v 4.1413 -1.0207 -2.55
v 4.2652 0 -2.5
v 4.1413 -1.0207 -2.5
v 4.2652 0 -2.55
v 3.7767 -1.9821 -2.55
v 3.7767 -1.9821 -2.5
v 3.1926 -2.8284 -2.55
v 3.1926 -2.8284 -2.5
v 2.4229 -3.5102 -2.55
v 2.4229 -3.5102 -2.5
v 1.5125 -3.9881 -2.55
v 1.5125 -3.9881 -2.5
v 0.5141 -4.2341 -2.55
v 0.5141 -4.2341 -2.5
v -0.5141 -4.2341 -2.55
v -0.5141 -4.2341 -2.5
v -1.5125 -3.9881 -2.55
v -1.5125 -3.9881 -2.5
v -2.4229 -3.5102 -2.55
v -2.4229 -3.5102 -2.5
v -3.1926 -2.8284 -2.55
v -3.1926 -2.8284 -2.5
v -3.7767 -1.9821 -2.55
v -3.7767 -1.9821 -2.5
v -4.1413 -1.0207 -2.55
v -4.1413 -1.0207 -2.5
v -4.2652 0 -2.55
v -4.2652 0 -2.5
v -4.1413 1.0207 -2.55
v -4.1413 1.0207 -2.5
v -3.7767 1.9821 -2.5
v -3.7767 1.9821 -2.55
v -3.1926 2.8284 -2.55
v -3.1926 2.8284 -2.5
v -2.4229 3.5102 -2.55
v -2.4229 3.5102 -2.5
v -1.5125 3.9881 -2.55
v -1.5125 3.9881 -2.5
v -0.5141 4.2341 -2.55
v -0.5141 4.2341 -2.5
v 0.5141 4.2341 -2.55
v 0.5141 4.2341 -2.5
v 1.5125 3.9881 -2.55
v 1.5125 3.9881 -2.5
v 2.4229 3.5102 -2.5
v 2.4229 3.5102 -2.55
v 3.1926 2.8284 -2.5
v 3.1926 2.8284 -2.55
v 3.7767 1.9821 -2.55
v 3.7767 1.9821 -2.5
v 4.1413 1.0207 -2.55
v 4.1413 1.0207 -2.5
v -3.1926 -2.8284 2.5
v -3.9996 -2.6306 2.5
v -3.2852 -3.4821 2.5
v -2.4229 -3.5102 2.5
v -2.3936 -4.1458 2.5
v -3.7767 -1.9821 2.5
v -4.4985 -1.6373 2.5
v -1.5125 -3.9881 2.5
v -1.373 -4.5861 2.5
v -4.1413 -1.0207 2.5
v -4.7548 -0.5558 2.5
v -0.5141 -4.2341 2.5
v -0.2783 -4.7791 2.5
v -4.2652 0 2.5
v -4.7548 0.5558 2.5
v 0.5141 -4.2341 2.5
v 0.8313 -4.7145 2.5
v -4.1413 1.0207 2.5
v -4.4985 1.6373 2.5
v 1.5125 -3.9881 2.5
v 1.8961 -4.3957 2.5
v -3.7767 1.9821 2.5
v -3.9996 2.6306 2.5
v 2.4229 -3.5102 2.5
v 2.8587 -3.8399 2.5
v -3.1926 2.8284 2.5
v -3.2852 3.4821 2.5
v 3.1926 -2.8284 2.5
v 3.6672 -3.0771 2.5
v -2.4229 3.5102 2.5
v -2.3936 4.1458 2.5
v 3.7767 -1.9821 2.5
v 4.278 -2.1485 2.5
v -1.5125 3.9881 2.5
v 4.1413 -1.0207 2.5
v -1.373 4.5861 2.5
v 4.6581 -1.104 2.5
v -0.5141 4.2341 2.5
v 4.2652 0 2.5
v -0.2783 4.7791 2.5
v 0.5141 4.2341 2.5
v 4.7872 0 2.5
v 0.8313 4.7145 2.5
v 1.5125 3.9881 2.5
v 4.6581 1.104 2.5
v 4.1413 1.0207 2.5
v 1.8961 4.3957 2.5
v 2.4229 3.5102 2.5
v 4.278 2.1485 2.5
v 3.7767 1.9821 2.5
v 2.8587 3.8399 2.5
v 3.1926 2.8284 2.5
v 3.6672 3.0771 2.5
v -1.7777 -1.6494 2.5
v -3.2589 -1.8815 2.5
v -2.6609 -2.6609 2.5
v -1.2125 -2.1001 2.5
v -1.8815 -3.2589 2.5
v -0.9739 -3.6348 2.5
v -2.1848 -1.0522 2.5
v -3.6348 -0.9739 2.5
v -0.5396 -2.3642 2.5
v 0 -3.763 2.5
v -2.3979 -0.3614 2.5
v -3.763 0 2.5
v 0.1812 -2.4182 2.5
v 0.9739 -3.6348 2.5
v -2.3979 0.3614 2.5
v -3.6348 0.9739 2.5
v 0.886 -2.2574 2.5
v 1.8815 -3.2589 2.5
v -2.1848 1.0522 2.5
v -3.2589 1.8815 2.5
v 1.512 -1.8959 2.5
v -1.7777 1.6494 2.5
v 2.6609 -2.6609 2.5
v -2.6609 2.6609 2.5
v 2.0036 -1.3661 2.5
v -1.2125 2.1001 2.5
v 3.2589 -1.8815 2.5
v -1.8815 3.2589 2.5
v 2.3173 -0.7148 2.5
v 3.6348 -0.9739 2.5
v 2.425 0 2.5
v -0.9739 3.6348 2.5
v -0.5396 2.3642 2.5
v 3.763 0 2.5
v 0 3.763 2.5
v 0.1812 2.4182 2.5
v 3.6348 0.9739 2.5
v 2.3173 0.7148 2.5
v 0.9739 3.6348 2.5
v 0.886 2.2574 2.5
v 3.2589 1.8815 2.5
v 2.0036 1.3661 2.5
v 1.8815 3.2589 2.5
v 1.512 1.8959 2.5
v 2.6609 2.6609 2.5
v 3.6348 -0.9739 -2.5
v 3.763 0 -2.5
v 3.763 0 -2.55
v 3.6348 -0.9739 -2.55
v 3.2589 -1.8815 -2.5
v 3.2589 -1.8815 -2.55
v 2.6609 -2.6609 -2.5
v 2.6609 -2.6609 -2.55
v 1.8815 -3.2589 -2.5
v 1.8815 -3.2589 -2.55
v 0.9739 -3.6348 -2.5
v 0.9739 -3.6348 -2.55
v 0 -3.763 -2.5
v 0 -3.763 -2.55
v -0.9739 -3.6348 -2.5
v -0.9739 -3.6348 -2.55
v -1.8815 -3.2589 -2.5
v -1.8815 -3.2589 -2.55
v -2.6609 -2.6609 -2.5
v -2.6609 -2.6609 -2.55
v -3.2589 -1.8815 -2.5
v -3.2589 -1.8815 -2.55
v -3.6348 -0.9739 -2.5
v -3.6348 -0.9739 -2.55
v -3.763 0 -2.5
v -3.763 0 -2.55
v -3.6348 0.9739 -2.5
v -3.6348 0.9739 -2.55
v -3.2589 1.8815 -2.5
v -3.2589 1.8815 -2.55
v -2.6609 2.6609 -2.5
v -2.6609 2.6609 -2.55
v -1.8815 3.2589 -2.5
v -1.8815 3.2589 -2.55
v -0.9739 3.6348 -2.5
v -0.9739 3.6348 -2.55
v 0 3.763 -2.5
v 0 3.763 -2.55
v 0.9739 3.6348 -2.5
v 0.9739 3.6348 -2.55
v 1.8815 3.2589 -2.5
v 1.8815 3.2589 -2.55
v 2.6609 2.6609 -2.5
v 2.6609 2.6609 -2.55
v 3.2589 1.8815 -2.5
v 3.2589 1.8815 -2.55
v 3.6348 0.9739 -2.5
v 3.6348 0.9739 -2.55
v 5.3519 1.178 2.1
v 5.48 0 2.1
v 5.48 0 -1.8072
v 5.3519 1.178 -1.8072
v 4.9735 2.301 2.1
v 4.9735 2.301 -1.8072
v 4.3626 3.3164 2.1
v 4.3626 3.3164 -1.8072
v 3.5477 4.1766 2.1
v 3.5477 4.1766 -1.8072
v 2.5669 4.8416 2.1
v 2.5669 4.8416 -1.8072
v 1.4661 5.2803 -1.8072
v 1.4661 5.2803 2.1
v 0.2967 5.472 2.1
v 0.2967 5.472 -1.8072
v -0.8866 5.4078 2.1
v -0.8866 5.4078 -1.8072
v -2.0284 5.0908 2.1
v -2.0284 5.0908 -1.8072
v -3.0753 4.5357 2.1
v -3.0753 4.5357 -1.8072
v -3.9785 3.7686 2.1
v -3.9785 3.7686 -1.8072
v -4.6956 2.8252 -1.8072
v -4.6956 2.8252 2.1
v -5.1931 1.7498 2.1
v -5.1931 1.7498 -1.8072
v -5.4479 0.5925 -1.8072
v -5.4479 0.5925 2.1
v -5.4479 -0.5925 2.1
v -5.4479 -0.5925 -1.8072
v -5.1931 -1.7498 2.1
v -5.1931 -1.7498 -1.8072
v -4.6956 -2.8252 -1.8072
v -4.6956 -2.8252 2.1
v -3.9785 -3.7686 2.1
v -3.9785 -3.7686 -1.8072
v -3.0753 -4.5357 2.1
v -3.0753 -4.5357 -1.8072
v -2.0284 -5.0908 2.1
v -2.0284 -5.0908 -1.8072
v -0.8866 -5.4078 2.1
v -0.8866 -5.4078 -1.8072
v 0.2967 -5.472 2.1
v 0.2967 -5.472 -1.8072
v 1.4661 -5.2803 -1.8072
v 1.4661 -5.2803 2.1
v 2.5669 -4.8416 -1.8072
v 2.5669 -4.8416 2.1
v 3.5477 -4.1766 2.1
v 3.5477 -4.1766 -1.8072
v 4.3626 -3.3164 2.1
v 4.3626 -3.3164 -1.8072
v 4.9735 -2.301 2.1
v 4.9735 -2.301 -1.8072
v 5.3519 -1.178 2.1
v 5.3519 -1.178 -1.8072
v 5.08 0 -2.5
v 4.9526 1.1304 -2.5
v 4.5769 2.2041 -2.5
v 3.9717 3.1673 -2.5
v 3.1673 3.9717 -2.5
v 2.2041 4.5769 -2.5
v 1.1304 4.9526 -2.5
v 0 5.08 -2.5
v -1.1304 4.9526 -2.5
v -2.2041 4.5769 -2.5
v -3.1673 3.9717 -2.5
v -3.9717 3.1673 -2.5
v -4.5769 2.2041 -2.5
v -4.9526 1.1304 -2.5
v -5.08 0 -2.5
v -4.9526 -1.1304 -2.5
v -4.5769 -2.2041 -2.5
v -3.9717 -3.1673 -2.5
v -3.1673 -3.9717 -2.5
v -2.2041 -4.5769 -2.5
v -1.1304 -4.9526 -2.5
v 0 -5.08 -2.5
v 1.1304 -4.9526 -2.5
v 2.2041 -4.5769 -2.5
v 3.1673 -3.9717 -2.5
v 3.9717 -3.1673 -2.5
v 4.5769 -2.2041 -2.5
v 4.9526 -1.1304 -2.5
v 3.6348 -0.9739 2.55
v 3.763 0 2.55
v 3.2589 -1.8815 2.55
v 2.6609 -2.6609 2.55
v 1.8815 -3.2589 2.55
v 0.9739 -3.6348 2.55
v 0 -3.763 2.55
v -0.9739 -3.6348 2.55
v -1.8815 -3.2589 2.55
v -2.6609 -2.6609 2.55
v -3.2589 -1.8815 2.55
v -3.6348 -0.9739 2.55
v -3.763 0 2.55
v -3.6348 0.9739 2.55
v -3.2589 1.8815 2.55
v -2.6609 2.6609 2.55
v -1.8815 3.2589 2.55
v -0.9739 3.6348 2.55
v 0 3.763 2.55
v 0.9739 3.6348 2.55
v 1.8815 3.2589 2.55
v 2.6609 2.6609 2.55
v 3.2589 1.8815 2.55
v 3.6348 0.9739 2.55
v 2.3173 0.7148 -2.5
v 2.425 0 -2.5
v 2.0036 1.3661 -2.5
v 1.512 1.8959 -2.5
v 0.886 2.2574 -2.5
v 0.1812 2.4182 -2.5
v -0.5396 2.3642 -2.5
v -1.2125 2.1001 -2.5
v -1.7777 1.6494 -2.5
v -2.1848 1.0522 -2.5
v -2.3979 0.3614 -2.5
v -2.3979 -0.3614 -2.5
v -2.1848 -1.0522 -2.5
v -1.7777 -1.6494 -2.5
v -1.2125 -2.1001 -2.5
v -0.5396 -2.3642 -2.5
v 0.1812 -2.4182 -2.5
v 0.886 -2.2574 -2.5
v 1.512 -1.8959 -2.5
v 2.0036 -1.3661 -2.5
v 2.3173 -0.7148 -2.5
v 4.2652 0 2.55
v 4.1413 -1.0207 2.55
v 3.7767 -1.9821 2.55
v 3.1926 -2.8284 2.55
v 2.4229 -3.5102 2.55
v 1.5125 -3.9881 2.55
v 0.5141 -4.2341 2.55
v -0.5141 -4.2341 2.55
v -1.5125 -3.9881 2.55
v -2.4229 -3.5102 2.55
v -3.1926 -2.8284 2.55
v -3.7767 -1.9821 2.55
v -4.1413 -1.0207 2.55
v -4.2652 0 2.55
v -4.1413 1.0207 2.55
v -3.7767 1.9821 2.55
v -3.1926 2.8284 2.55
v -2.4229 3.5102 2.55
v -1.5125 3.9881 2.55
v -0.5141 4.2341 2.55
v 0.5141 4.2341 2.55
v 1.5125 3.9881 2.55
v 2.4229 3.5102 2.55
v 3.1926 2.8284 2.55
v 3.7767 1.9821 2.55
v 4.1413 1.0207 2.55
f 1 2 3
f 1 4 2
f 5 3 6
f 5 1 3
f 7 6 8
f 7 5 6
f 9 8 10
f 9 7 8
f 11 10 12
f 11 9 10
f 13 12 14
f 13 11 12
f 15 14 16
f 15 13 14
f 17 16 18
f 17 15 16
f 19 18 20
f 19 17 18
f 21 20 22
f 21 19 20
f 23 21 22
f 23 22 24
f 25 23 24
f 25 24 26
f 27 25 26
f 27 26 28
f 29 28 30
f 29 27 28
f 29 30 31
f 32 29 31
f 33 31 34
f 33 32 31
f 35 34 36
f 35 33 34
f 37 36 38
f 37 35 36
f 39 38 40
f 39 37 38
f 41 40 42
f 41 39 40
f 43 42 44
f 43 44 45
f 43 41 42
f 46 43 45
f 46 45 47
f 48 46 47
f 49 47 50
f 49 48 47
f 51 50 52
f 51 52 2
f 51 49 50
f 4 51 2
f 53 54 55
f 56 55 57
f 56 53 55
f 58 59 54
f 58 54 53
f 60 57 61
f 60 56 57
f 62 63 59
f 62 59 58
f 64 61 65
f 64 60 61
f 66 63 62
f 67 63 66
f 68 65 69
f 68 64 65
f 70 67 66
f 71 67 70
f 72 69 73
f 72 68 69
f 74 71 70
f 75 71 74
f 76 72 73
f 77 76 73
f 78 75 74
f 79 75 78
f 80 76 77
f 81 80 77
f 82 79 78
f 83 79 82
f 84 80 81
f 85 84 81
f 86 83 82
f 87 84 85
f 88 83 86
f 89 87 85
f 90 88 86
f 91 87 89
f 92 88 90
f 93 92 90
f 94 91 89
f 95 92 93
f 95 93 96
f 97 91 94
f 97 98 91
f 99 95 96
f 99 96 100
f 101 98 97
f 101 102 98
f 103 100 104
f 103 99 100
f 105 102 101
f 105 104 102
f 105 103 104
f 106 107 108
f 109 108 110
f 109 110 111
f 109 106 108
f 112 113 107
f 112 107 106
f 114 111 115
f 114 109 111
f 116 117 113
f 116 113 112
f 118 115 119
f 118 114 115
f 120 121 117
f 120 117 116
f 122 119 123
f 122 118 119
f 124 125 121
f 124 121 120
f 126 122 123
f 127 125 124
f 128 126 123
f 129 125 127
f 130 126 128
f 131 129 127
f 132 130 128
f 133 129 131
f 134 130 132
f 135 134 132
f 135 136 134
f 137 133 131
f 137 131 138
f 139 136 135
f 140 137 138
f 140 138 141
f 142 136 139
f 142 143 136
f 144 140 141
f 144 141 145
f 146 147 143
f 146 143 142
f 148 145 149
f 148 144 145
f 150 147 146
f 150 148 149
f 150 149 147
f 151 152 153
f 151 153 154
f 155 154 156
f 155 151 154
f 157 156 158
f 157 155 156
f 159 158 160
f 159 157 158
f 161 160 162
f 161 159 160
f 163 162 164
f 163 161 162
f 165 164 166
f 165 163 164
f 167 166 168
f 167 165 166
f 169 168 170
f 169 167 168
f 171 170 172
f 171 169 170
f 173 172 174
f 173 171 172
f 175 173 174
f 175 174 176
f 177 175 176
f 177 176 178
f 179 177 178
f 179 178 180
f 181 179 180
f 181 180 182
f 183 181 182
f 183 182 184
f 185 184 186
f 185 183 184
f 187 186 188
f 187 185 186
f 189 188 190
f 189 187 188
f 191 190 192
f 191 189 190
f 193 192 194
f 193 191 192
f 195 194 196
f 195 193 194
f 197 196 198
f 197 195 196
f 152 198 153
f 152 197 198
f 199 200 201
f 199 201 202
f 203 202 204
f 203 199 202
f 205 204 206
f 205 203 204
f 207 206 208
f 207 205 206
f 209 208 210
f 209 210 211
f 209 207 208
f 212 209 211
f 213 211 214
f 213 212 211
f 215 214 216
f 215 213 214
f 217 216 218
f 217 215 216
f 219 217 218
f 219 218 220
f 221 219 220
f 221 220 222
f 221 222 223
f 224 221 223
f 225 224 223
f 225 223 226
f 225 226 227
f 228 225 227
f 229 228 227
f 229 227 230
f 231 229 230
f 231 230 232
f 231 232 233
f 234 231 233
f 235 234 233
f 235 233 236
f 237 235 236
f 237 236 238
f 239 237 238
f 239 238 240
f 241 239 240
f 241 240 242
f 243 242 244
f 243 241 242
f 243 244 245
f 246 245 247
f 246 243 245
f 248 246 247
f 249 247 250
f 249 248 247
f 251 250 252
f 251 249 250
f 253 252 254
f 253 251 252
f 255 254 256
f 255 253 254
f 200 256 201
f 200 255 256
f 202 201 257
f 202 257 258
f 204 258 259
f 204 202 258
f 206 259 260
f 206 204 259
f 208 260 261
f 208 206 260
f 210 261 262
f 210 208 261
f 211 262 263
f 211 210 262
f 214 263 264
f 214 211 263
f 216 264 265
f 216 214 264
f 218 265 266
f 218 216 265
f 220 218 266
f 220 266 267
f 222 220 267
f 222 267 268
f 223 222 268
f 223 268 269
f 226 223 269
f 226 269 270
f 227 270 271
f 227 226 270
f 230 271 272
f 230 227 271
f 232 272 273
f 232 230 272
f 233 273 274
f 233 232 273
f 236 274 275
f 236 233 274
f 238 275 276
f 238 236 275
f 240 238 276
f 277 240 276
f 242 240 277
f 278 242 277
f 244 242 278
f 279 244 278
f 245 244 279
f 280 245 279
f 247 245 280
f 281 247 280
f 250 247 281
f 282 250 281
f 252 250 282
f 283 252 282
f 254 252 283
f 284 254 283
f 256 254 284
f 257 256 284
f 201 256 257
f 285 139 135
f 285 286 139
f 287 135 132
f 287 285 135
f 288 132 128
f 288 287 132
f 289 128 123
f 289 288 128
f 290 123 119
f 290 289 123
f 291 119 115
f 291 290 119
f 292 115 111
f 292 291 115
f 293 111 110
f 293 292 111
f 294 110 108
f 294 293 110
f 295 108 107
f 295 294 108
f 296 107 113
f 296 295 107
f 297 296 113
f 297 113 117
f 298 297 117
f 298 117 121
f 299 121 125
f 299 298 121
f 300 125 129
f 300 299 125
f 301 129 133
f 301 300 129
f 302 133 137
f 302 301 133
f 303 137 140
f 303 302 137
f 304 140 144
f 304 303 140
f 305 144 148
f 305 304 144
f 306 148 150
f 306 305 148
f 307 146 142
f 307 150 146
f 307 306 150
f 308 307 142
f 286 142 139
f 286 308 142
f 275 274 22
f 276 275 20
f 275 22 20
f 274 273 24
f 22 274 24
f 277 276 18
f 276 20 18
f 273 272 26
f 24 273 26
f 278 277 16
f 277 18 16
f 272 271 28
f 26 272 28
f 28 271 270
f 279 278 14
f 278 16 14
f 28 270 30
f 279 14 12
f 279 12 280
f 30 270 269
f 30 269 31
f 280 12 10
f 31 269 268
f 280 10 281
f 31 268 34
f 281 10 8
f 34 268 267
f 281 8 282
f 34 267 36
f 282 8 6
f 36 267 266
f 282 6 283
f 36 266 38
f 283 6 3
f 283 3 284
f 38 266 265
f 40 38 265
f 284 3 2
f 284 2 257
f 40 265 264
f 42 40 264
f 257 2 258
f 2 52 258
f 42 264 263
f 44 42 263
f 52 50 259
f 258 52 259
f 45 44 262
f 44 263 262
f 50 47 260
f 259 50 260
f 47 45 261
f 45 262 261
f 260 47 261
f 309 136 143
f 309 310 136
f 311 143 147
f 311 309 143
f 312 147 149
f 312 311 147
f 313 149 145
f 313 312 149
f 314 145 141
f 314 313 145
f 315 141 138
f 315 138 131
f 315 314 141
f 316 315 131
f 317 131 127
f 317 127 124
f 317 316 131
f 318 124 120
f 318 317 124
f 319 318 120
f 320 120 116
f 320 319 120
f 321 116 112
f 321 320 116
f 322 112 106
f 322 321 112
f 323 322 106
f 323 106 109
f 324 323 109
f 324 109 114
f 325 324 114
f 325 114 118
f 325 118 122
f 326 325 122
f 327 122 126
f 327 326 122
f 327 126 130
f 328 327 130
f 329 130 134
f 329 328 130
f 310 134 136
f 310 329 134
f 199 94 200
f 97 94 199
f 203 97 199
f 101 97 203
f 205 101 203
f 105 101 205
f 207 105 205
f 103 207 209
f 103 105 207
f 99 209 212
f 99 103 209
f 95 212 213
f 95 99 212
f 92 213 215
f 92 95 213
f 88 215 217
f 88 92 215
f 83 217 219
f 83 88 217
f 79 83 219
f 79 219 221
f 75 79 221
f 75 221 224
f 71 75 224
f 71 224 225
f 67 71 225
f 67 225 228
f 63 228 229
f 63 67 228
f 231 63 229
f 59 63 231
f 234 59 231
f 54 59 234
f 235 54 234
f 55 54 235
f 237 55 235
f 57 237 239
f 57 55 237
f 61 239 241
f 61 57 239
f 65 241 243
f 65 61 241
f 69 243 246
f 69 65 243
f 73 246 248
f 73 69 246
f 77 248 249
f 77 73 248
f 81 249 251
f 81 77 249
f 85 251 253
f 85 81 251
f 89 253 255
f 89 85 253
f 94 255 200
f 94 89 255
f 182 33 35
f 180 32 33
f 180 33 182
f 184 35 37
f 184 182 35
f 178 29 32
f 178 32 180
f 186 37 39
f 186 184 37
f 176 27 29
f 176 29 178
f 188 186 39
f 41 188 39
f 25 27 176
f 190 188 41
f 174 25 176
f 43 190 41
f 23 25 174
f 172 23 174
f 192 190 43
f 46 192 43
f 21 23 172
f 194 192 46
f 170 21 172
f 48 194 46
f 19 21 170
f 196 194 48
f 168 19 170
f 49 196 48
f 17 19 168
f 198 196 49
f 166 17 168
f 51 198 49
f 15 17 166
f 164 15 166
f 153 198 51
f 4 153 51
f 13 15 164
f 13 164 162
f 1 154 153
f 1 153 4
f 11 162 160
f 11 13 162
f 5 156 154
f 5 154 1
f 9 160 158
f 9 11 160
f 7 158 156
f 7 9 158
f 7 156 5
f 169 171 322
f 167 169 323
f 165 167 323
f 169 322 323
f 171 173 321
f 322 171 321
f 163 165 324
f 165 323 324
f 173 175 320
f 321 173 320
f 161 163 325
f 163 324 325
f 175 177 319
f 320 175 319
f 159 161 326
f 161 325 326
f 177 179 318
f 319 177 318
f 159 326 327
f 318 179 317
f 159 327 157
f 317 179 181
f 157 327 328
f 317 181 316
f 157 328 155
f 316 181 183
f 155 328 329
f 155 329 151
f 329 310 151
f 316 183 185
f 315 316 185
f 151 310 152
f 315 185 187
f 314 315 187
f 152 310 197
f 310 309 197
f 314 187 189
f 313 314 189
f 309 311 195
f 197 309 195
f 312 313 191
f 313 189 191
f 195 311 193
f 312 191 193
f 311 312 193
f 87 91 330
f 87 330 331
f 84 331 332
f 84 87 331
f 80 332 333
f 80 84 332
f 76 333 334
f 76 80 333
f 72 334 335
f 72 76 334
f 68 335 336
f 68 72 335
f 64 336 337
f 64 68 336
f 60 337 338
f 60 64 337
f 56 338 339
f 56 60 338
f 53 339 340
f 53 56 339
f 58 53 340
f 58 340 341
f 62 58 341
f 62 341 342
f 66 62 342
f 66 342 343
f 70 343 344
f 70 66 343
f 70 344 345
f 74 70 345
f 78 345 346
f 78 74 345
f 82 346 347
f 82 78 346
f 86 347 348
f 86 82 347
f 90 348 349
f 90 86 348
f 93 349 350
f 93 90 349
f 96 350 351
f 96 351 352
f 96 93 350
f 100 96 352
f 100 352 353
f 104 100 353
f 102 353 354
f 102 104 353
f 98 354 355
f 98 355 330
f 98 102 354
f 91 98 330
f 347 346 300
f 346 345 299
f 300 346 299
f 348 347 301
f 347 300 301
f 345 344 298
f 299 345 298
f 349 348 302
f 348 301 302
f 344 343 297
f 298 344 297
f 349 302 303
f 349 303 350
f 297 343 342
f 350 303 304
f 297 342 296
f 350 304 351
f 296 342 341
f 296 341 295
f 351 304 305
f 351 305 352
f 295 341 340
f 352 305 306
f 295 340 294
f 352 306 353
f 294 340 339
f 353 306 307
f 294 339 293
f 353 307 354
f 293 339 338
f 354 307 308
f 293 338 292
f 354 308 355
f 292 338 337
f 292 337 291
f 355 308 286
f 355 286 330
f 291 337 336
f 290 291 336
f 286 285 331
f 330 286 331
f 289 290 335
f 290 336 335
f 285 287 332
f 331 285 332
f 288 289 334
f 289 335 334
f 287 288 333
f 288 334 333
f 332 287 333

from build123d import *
from OCP.BRepFilletAPI import BRepFilletAPI_MakeChamfer

# Parameters (mm, degrees)
CROQUIS1_R              = 5.48
CROQUIS1_R_2            = 2.425
SALIENTE_EXTRUIR1_DEPTH = 2.5
CHAFL_N1_SIZE           = 0.4
CHAFL_N1_SIZE2          = 0.692820323
CROQUIS2_R              = 4.265221528
CROQUIS2_R_2            = 3.76303741
SALIENTE_EXTRUIR2_DEPTH = 2.55


with BuildPart() as part:
    # Croquis1 → Saliente-Extruir1 (new, symmetric)
    with BuildSketch(Plane.XY):
        Circle(CROQUIS1_R)
        Circle(CROQUIS1_R_2, mode=Mode.SUBTRACT)
    extrude(amount=SALIENTE_EXTRUIR1_DEPTH, both=True)

    # Chaflán1: one chamfer whose edges measure the first distance from different faces: ONE call of the kernel's chamfer builder (chamfer() names one face for all edges)
    chafl_n1_edges_1 = [part.edges().sort_by_distance(p)[0] for p in [
        (-5.48, 0, -2.5),
    ]]
    chafl_n1_side_1 = [part.faces().sort_by_distance(p)[0] for p in [
        (-5.325002194, 0, -2.5),
    ]]
    chafl_n1_edges_2 = [part.edges().sort_by_distance(p)[0] for p in [
        (-5.48, 0, 2.5),
    ]]
    chafl_n1_side_2 = [part.faces().sort_by_distance(p)[0] for p in [
        (-5.48, 0, 0),
    ]]
    chafl_n1 = BRepFilletAPI_MakeChamfer(part.part.solid().wrapped)
    for e in chafl_n1_edges_1:
        chafl_n1.Add(CHAFL_N1_SIZE, CHAFL_N1_SIZE2, e.wrapped, chafl_n1_side_1[0].wrapped)  # the first distance lies on this face
    for e in chafl_n1_edges_2:
        chafl_n1.Add(CHAFL_N1_SIZE, CHAFL_N1_SIZE2, e.wrapped, chafl_n1_side_2[0].wrapped)  # the first distance lies on this face
    add(Compound.cast(chafl_n1.Shape()), mode=Mode.REPLACE)

    # Croquis2 → Saliente-Extruir2 (add, symmetric)
    with BuildSketch(Plane(origin=(0, 0, 0), x_dir=(-1, 0, 0), z_dir=(0, 0, -1))):
        with Locations(Location((0, 0, 0), (0, 0, 180))):
            Circle(CROQUIS2_R)
        with Locations(Location((0, 0, 0), (0, 0, 180))):
            Circle(CROQUIS2_R_2, mode=Mode.SUBTRACT)
    extrude(amount=SALIENTE_EXTRUIR2_DEPTH, both=True)


solid = part.part
